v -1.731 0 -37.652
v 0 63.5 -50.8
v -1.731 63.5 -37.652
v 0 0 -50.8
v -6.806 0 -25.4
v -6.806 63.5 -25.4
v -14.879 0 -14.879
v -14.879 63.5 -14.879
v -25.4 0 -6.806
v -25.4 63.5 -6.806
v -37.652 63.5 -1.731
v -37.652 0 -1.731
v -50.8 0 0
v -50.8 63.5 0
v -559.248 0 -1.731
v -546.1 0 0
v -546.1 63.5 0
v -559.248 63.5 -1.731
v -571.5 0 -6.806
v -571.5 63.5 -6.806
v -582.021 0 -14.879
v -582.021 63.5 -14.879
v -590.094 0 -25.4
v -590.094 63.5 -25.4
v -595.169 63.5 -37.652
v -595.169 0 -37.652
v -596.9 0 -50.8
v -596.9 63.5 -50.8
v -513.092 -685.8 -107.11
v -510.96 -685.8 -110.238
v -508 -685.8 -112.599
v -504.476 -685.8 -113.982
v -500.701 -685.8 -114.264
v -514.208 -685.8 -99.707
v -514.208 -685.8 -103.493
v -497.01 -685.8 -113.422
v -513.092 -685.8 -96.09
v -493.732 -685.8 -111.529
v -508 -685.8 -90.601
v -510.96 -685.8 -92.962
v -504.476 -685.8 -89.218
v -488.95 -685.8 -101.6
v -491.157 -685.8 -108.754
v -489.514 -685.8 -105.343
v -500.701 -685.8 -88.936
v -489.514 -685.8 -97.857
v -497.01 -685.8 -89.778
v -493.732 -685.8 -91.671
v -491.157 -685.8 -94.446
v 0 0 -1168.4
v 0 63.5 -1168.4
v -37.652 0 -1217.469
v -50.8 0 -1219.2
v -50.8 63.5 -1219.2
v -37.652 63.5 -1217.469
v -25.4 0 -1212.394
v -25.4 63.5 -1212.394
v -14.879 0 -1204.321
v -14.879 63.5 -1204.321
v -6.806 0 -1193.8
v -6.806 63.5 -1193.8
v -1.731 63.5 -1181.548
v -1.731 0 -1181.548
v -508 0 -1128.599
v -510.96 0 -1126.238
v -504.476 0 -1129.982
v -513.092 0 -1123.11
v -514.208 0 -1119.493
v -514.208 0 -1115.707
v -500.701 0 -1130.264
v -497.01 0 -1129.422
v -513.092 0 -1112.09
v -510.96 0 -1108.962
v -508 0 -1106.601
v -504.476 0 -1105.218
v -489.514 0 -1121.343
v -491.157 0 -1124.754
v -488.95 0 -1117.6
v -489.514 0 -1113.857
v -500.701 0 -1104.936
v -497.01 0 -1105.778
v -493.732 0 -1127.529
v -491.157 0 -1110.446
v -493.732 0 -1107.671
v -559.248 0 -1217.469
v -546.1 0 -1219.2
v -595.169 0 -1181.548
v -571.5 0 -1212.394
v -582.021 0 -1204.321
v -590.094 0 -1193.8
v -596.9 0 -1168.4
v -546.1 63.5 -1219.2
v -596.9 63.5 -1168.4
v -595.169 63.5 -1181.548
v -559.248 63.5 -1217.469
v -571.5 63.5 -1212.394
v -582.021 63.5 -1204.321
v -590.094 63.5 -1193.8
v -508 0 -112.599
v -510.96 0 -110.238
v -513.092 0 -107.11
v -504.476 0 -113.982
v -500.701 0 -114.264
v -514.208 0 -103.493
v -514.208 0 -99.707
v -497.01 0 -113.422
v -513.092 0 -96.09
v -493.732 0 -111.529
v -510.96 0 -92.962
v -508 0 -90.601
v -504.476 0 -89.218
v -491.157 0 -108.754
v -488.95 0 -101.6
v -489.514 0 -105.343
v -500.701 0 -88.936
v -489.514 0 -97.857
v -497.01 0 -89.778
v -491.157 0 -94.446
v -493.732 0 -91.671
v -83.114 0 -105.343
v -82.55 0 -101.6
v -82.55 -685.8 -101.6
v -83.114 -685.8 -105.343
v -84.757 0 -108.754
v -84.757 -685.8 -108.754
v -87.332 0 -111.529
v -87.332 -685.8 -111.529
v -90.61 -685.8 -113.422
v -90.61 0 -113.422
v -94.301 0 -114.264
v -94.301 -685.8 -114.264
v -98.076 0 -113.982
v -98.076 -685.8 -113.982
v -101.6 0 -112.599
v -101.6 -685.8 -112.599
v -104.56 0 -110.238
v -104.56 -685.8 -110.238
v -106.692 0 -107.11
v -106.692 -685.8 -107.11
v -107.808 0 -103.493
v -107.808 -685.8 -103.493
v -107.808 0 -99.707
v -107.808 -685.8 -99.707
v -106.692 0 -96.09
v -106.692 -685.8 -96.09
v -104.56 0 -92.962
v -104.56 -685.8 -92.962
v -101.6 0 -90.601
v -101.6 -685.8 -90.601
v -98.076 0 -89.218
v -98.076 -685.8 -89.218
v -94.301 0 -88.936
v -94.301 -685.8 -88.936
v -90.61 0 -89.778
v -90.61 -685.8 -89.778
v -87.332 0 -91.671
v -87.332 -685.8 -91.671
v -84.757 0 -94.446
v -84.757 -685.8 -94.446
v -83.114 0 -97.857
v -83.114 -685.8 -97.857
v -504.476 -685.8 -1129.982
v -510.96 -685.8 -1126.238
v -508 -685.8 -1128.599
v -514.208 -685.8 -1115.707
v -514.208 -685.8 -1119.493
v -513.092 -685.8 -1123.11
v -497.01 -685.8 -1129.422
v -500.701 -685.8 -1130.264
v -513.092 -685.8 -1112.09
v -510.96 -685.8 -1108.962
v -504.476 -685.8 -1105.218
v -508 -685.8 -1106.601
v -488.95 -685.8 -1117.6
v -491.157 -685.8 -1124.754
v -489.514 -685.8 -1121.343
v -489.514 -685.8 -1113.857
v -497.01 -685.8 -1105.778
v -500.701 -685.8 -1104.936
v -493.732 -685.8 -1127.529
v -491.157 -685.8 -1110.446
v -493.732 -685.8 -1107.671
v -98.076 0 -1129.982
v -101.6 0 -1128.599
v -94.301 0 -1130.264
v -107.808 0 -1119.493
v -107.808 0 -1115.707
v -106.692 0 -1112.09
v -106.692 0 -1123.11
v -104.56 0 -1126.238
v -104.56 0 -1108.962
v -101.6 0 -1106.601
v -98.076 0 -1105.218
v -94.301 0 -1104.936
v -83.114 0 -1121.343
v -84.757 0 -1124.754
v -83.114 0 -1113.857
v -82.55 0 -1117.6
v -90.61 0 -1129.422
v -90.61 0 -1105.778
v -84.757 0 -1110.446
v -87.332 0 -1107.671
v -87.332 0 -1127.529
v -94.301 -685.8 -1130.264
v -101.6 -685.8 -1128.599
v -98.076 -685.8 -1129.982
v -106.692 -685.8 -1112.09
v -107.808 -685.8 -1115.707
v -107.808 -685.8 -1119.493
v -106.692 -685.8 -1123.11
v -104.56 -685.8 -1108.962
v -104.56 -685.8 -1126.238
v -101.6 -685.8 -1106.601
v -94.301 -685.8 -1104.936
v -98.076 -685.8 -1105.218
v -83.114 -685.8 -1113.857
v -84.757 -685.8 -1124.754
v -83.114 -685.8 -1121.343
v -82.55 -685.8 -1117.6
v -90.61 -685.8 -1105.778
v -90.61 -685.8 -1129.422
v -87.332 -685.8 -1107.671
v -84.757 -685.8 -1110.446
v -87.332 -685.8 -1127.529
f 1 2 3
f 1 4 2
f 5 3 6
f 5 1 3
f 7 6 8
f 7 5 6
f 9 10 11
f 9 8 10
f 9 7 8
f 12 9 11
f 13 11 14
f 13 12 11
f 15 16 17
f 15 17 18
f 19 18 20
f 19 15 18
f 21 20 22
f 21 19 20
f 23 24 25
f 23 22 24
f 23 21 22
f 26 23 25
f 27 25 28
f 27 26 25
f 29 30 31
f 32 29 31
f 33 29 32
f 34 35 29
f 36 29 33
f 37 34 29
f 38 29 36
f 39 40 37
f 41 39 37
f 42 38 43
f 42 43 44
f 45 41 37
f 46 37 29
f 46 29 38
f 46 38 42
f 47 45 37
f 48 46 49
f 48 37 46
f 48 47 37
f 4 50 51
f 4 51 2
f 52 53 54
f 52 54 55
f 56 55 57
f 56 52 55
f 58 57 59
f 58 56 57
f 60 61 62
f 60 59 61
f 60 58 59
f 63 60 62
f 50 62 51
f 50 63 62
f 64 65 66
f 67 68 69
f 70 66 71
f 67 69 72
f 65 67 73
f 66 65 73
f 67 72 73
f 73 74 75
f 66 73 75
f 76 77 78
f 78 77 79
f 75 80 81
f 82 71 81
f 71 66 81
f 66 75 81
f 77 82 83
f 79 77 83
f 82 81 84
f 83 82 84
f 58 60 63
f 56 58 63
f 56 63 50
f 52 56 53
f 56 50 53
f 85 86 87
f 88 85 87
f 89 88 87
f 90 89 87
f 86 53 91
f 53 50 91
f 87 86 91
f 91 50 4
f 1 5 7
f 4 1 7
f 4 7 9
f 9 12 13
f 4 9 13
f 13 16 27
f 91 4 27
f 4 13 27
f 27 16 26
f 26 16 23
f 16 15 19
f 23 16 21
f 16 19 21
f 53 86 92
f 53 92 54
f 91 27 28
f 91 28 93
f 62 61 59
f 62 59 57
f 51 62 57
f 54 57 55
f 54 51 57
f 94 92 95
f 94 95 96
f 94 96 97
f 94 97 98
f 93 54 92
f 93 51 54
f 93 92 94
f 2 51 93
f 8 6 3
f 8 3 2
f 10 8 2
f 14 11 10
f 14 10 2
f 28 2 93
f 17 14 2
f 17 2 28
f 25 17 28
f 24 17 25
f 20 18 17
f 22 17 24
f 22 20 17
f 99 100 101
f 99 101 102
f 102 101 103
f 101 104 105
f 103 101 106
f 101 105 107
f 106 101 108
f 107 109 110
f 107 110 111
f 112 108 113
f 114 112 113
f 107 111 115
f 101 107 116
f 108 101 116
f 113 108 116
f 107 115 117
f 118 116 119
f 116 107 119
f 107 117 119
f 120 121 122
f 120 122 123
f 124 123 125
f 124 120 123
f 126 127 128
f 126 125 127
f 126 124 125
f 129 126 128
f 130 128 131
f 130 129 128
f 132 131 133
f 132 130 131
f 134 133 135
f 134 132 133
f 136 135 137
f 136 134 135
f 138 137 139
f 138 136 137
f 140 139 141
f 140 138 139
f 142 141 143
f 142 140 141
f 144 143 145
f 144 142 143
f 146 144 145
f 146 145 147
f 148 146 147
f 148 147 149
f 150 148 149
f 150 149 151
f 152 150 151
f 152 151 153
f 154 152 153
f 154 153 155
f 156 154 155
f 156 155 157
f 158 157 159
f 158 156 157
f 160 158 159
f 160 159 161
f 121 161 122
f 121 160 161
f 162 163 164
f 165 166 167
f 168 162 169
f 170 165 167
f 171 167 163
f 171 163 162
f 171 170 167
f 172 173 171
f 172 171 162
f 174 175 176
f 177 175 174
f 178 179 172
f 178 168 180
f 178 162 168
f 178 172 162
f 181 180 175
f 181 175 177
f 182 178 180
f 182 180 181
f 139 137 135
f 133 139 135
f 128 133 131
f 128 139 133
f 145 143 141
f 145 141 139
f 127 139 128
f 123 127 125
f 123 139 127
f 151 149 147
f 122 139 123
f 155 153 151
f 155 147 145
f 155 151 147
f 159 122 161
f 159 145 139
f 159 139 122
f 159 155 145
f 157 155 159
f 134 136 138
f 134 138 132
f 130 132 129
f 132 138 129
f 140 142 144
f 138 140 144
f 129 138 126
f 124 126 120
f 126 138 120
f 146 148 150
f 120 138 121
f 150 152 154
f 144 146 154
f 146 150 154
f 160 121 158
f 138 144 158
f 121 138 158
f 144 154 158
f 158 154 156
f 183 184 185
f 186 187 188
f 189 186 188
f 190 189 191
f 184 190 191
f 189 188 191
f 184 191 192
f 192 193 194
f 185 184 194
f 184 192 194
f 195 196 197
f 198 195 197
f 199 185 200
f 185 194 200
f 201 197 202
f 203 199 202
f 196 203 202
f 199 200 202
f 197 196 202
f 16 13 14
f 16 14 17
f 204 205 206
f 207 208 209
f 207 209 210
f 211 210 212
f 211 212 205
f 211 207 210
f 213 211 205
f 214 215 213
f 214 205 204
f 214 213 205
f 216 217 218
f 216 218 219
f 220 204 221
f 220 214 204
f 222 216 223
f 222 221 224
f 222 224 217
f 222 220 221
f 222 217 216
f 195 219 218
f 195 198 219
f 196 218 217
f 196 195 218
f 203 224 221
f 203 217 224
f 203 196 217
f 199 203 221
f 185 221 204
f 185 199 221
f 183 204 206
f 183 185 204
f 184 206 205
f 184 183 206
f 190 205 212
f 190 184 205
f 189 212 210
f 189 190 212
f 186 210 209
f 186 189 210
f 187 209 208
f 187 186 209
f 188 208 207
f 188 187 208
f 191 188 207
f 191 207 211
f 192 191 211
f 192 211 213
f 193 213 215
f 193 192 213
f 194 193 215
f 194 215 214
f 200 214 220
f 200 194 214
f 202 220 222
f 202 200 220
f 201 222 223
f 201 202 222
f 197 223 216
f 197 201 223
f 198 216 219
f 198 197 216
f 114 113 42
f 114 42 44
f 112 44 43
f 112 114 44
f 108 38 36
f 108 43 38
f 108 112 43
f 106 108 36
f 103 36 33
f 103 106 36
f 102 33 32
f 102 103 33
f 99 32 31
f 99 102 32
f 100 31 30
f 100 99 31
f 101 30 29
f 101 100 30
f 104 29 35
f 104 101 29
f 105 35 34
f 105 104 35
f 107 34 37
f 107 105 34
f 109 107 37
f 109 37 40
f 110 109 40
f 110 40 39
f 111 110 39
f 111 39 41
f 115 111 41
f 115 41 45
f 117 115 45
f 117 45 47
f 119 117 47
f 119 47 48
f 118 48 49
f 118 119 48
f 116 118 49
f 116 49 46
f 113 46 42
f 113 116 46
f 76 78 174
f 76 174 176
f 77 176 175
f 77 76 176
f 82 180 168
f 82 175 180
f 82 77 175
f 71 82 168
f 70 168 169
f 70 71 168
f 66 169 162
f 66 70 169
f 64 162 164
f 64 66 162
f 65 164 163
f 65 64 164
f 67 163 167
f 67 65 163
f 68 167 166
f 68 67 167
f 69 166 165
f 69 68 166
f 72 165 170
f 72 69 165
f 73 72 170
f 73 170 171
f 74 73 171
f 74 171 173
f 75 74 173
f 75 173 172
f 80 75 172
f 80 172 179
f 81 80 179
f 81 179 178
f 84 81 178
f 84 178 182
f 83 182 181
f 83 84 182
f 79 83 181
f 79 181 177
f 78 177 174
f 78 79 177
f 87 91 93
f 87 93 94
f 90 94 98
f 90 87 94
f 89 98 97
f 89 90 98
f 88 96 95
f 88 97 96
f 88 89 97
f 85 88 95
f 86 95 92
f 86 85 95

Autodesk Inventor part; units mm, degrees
ref_plane "YZ Plane" through (0, 0, 0) normal (1, 0, 0) x (0, 1, 0)
ref_plane "XZ Plane" through (0, 0, 0) normal (0, 1, 0) x (-1, 0, 0)
ref_plane "XY Plane" through (0, 0, 0) normal (0, 0, 1) x (1, 0, 0)
sketch "Sketch1" plane through (0, 0, 0) normal (0, 1, 0) x (-1, 0, 0)
  line L0 (50.8, 0) -> (546.1, 0)
  line L1 (596.9, -50.8) -> (596.9, -1168.4)
  line L2 (546.1, -1219.2) -> (50.8, -1219.2)
  line L3 (0, -1168.4) -> (0, -50.8)
  arc A0 (596.9, -50.8) -> (546.1, 0) centre (546.1, -50.8) ccw
  arc A1 (50.8, 0) -> (0, -50.8) centre (50.8, -50.8) ccw
  arc A2 (0, -1168.4) -> (50.8, -1219.2) centre (50.8, -1168.4) ccw
  arc A3 (546.1, -1219.2) -> (596.9, -1168.4) centre (546.1, -1168.4) ccw
  point P0 (0, 0)
  point P1 (596.9, -1219.2)
  point P2 (596.9, 0)
  point P3 (0, -1219.2)
  dimension "d0" = 596.9
  dimension "d1" = 1219.2
  dimension "d2" = 50.8
extrude "Extrusion1" add sketch "Sketch1" along normal blind 63.5
sketch "Sketch2" plane through (0, 0, 0) normal (0, -1, 0) x (1, 0, 0)
  circle A0 centre (-95.25, -101.6) radius 12.7
  line L0 (-222.0778, -191.3187) -> (-285.2767, -191.3187) construction
  circle A1 centre (-501.65, -101.6) radius 12.7
  line L1 (0, -50.8) -> (0, -1168.4) projected
  line L2 (-596.9, -1168.4) -> (-596.9, -50.8) projected
  line L3 (-50.8, -1219.2) -> (-546.1, -1219.2) projected
  line L4 (-546.1, 0) -> (-50.8, 0) projected
  circle A2 centre (-95.25, -1117.6) radius 12.7
  circle A3 centre (-501.65, -1117.6) radius 12.7
  point P0 (0, 0)
  dimension "d5" = 12.7
  dimension "d8" = 406.4
  dimension "d13" = 95.25
  dimension "d15" = 95.25
  dimension "d16" = 596.9
  dimension "d17" = 1219.2
  dimension "d18" = 101.6
  dimension "d21" = 1016
  dimension "d26" = 101.6
extrude "Extrusion2" add sketch "Sketch2" along normal blind 685.8 separate body
equation "\"d13\" = d15"
equation "\"d15\" = 0.5 * d16 - 0.5 * d8"
equation "\"d18\" = 0.0833333 * d17"
equation "\"d26\" = d18"
properties part number "table" material "Wood (Oak)"
